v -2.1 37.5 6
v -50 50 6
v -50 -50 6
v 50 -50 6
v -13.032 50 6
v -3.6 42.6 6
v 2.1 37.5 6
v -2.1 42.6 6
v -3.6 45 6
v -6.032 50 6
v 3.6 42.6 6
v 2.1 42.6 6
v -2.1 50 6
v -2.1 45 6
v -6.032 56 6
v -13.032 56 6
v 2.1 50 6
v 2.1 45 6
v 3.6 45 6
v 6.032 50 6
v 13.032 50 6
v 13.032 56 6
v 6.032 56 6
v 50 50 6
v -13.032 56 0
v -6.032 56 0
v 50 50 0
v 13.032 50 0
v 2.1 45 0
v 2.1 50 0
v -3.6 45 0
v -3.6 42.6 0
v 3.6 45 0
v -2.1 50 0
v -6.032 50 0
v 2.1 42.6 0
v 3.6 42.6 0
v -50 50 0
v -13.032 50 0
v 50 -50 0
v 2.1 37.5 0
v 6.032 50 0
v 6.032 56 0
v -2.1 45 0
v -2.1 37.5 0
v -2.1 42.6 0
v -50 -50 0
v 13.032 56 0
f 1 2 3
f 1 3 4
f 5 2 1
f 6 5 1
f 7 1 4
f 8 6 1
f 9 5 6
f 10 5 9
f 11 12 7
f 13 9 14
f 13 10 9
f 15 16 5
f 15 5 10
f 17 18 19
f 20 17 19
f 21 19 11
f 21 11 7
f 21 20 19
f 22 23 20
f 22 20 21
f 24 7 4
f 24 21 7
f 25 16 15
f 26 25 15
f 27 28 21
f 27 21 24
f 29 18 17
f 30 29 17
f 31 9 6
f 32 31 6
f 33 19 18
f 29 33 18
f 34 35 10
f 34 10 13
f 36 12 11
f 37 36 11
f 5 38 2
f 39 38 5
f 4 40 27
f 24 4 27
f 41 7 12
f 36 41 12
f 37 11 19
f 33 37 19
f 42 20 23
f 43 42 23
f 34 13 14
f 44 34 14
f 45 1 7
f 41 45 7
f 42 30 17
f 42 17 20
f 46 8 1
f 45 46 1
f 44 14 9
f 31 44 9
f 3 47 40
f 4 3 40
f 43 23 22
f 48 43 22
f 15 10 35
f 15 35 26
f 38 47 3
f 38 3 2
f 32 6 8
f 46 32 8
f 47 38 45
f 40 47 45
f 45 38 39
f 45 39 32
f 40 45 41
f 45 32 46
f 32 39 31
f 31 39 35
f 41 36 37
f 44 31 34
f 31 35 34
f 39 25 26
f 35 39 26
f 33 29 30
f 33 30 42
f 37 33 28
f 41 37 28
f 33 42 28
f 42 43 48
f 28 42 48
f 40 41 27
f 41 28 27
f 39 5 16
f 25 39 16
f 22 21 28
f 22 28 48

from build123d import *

# Parameters (mm, degrees)
SKETCH_1_W          = 100
SKETCH_1_H          = 100
EXTRUDE_1_DEPTH     = 6
SKETCH_2_W          = 7
SKETCH_2_H          = 6
EXTRUDE_2_DEPTH     = 6
CUT_EXTRUDE_1_DEPTH = 7


with BuildPart() as part:
    # Эскиз1 → Бобышка-Вытянуть1 (new body)
    with BuildSketch(Plane.XY):
        Rectangle(SKETCH_1_W, SKETCH_1_H)
    extrude(amount=EXTRUDE_1_DEPTH)

    # Эскиз2 → Бобышка-Вытянуть2 (add)
    with BuildSketch(Plane.XY.offset(6)):
        with Locations((-9.531849908, 53)):
            Rectangle(SKETCH_2_W, SKETCH_2_H)
        with Locations((9.531849908, 53)):
            Rectangle(SKETCH_2_W, SKETCH_2_H)
    extrude(amount=-EXTRUDE_2_DEPTH)

    # Эскиз3 → Вырез-Вытянуть1 (cut, through all)
    with BuildSketch(Plane.XY.offset(6)):
        Polygon((-2.1, 45), (-3.6, 45), (-3.6, 42.6), (-2.1, 42.6), (-2.1, 37.5), (2.1, 37.5), (2.1, 42.6), (3.6, 42.6), (3.6, 45), (2.1, 45), (2.1, 50), (-2.1, 50), align=None)
    extrude(amount=-CUT_EXTRUDE_1_DEPTH, mode=Mode.SUBTRACT)


solid = part.part
